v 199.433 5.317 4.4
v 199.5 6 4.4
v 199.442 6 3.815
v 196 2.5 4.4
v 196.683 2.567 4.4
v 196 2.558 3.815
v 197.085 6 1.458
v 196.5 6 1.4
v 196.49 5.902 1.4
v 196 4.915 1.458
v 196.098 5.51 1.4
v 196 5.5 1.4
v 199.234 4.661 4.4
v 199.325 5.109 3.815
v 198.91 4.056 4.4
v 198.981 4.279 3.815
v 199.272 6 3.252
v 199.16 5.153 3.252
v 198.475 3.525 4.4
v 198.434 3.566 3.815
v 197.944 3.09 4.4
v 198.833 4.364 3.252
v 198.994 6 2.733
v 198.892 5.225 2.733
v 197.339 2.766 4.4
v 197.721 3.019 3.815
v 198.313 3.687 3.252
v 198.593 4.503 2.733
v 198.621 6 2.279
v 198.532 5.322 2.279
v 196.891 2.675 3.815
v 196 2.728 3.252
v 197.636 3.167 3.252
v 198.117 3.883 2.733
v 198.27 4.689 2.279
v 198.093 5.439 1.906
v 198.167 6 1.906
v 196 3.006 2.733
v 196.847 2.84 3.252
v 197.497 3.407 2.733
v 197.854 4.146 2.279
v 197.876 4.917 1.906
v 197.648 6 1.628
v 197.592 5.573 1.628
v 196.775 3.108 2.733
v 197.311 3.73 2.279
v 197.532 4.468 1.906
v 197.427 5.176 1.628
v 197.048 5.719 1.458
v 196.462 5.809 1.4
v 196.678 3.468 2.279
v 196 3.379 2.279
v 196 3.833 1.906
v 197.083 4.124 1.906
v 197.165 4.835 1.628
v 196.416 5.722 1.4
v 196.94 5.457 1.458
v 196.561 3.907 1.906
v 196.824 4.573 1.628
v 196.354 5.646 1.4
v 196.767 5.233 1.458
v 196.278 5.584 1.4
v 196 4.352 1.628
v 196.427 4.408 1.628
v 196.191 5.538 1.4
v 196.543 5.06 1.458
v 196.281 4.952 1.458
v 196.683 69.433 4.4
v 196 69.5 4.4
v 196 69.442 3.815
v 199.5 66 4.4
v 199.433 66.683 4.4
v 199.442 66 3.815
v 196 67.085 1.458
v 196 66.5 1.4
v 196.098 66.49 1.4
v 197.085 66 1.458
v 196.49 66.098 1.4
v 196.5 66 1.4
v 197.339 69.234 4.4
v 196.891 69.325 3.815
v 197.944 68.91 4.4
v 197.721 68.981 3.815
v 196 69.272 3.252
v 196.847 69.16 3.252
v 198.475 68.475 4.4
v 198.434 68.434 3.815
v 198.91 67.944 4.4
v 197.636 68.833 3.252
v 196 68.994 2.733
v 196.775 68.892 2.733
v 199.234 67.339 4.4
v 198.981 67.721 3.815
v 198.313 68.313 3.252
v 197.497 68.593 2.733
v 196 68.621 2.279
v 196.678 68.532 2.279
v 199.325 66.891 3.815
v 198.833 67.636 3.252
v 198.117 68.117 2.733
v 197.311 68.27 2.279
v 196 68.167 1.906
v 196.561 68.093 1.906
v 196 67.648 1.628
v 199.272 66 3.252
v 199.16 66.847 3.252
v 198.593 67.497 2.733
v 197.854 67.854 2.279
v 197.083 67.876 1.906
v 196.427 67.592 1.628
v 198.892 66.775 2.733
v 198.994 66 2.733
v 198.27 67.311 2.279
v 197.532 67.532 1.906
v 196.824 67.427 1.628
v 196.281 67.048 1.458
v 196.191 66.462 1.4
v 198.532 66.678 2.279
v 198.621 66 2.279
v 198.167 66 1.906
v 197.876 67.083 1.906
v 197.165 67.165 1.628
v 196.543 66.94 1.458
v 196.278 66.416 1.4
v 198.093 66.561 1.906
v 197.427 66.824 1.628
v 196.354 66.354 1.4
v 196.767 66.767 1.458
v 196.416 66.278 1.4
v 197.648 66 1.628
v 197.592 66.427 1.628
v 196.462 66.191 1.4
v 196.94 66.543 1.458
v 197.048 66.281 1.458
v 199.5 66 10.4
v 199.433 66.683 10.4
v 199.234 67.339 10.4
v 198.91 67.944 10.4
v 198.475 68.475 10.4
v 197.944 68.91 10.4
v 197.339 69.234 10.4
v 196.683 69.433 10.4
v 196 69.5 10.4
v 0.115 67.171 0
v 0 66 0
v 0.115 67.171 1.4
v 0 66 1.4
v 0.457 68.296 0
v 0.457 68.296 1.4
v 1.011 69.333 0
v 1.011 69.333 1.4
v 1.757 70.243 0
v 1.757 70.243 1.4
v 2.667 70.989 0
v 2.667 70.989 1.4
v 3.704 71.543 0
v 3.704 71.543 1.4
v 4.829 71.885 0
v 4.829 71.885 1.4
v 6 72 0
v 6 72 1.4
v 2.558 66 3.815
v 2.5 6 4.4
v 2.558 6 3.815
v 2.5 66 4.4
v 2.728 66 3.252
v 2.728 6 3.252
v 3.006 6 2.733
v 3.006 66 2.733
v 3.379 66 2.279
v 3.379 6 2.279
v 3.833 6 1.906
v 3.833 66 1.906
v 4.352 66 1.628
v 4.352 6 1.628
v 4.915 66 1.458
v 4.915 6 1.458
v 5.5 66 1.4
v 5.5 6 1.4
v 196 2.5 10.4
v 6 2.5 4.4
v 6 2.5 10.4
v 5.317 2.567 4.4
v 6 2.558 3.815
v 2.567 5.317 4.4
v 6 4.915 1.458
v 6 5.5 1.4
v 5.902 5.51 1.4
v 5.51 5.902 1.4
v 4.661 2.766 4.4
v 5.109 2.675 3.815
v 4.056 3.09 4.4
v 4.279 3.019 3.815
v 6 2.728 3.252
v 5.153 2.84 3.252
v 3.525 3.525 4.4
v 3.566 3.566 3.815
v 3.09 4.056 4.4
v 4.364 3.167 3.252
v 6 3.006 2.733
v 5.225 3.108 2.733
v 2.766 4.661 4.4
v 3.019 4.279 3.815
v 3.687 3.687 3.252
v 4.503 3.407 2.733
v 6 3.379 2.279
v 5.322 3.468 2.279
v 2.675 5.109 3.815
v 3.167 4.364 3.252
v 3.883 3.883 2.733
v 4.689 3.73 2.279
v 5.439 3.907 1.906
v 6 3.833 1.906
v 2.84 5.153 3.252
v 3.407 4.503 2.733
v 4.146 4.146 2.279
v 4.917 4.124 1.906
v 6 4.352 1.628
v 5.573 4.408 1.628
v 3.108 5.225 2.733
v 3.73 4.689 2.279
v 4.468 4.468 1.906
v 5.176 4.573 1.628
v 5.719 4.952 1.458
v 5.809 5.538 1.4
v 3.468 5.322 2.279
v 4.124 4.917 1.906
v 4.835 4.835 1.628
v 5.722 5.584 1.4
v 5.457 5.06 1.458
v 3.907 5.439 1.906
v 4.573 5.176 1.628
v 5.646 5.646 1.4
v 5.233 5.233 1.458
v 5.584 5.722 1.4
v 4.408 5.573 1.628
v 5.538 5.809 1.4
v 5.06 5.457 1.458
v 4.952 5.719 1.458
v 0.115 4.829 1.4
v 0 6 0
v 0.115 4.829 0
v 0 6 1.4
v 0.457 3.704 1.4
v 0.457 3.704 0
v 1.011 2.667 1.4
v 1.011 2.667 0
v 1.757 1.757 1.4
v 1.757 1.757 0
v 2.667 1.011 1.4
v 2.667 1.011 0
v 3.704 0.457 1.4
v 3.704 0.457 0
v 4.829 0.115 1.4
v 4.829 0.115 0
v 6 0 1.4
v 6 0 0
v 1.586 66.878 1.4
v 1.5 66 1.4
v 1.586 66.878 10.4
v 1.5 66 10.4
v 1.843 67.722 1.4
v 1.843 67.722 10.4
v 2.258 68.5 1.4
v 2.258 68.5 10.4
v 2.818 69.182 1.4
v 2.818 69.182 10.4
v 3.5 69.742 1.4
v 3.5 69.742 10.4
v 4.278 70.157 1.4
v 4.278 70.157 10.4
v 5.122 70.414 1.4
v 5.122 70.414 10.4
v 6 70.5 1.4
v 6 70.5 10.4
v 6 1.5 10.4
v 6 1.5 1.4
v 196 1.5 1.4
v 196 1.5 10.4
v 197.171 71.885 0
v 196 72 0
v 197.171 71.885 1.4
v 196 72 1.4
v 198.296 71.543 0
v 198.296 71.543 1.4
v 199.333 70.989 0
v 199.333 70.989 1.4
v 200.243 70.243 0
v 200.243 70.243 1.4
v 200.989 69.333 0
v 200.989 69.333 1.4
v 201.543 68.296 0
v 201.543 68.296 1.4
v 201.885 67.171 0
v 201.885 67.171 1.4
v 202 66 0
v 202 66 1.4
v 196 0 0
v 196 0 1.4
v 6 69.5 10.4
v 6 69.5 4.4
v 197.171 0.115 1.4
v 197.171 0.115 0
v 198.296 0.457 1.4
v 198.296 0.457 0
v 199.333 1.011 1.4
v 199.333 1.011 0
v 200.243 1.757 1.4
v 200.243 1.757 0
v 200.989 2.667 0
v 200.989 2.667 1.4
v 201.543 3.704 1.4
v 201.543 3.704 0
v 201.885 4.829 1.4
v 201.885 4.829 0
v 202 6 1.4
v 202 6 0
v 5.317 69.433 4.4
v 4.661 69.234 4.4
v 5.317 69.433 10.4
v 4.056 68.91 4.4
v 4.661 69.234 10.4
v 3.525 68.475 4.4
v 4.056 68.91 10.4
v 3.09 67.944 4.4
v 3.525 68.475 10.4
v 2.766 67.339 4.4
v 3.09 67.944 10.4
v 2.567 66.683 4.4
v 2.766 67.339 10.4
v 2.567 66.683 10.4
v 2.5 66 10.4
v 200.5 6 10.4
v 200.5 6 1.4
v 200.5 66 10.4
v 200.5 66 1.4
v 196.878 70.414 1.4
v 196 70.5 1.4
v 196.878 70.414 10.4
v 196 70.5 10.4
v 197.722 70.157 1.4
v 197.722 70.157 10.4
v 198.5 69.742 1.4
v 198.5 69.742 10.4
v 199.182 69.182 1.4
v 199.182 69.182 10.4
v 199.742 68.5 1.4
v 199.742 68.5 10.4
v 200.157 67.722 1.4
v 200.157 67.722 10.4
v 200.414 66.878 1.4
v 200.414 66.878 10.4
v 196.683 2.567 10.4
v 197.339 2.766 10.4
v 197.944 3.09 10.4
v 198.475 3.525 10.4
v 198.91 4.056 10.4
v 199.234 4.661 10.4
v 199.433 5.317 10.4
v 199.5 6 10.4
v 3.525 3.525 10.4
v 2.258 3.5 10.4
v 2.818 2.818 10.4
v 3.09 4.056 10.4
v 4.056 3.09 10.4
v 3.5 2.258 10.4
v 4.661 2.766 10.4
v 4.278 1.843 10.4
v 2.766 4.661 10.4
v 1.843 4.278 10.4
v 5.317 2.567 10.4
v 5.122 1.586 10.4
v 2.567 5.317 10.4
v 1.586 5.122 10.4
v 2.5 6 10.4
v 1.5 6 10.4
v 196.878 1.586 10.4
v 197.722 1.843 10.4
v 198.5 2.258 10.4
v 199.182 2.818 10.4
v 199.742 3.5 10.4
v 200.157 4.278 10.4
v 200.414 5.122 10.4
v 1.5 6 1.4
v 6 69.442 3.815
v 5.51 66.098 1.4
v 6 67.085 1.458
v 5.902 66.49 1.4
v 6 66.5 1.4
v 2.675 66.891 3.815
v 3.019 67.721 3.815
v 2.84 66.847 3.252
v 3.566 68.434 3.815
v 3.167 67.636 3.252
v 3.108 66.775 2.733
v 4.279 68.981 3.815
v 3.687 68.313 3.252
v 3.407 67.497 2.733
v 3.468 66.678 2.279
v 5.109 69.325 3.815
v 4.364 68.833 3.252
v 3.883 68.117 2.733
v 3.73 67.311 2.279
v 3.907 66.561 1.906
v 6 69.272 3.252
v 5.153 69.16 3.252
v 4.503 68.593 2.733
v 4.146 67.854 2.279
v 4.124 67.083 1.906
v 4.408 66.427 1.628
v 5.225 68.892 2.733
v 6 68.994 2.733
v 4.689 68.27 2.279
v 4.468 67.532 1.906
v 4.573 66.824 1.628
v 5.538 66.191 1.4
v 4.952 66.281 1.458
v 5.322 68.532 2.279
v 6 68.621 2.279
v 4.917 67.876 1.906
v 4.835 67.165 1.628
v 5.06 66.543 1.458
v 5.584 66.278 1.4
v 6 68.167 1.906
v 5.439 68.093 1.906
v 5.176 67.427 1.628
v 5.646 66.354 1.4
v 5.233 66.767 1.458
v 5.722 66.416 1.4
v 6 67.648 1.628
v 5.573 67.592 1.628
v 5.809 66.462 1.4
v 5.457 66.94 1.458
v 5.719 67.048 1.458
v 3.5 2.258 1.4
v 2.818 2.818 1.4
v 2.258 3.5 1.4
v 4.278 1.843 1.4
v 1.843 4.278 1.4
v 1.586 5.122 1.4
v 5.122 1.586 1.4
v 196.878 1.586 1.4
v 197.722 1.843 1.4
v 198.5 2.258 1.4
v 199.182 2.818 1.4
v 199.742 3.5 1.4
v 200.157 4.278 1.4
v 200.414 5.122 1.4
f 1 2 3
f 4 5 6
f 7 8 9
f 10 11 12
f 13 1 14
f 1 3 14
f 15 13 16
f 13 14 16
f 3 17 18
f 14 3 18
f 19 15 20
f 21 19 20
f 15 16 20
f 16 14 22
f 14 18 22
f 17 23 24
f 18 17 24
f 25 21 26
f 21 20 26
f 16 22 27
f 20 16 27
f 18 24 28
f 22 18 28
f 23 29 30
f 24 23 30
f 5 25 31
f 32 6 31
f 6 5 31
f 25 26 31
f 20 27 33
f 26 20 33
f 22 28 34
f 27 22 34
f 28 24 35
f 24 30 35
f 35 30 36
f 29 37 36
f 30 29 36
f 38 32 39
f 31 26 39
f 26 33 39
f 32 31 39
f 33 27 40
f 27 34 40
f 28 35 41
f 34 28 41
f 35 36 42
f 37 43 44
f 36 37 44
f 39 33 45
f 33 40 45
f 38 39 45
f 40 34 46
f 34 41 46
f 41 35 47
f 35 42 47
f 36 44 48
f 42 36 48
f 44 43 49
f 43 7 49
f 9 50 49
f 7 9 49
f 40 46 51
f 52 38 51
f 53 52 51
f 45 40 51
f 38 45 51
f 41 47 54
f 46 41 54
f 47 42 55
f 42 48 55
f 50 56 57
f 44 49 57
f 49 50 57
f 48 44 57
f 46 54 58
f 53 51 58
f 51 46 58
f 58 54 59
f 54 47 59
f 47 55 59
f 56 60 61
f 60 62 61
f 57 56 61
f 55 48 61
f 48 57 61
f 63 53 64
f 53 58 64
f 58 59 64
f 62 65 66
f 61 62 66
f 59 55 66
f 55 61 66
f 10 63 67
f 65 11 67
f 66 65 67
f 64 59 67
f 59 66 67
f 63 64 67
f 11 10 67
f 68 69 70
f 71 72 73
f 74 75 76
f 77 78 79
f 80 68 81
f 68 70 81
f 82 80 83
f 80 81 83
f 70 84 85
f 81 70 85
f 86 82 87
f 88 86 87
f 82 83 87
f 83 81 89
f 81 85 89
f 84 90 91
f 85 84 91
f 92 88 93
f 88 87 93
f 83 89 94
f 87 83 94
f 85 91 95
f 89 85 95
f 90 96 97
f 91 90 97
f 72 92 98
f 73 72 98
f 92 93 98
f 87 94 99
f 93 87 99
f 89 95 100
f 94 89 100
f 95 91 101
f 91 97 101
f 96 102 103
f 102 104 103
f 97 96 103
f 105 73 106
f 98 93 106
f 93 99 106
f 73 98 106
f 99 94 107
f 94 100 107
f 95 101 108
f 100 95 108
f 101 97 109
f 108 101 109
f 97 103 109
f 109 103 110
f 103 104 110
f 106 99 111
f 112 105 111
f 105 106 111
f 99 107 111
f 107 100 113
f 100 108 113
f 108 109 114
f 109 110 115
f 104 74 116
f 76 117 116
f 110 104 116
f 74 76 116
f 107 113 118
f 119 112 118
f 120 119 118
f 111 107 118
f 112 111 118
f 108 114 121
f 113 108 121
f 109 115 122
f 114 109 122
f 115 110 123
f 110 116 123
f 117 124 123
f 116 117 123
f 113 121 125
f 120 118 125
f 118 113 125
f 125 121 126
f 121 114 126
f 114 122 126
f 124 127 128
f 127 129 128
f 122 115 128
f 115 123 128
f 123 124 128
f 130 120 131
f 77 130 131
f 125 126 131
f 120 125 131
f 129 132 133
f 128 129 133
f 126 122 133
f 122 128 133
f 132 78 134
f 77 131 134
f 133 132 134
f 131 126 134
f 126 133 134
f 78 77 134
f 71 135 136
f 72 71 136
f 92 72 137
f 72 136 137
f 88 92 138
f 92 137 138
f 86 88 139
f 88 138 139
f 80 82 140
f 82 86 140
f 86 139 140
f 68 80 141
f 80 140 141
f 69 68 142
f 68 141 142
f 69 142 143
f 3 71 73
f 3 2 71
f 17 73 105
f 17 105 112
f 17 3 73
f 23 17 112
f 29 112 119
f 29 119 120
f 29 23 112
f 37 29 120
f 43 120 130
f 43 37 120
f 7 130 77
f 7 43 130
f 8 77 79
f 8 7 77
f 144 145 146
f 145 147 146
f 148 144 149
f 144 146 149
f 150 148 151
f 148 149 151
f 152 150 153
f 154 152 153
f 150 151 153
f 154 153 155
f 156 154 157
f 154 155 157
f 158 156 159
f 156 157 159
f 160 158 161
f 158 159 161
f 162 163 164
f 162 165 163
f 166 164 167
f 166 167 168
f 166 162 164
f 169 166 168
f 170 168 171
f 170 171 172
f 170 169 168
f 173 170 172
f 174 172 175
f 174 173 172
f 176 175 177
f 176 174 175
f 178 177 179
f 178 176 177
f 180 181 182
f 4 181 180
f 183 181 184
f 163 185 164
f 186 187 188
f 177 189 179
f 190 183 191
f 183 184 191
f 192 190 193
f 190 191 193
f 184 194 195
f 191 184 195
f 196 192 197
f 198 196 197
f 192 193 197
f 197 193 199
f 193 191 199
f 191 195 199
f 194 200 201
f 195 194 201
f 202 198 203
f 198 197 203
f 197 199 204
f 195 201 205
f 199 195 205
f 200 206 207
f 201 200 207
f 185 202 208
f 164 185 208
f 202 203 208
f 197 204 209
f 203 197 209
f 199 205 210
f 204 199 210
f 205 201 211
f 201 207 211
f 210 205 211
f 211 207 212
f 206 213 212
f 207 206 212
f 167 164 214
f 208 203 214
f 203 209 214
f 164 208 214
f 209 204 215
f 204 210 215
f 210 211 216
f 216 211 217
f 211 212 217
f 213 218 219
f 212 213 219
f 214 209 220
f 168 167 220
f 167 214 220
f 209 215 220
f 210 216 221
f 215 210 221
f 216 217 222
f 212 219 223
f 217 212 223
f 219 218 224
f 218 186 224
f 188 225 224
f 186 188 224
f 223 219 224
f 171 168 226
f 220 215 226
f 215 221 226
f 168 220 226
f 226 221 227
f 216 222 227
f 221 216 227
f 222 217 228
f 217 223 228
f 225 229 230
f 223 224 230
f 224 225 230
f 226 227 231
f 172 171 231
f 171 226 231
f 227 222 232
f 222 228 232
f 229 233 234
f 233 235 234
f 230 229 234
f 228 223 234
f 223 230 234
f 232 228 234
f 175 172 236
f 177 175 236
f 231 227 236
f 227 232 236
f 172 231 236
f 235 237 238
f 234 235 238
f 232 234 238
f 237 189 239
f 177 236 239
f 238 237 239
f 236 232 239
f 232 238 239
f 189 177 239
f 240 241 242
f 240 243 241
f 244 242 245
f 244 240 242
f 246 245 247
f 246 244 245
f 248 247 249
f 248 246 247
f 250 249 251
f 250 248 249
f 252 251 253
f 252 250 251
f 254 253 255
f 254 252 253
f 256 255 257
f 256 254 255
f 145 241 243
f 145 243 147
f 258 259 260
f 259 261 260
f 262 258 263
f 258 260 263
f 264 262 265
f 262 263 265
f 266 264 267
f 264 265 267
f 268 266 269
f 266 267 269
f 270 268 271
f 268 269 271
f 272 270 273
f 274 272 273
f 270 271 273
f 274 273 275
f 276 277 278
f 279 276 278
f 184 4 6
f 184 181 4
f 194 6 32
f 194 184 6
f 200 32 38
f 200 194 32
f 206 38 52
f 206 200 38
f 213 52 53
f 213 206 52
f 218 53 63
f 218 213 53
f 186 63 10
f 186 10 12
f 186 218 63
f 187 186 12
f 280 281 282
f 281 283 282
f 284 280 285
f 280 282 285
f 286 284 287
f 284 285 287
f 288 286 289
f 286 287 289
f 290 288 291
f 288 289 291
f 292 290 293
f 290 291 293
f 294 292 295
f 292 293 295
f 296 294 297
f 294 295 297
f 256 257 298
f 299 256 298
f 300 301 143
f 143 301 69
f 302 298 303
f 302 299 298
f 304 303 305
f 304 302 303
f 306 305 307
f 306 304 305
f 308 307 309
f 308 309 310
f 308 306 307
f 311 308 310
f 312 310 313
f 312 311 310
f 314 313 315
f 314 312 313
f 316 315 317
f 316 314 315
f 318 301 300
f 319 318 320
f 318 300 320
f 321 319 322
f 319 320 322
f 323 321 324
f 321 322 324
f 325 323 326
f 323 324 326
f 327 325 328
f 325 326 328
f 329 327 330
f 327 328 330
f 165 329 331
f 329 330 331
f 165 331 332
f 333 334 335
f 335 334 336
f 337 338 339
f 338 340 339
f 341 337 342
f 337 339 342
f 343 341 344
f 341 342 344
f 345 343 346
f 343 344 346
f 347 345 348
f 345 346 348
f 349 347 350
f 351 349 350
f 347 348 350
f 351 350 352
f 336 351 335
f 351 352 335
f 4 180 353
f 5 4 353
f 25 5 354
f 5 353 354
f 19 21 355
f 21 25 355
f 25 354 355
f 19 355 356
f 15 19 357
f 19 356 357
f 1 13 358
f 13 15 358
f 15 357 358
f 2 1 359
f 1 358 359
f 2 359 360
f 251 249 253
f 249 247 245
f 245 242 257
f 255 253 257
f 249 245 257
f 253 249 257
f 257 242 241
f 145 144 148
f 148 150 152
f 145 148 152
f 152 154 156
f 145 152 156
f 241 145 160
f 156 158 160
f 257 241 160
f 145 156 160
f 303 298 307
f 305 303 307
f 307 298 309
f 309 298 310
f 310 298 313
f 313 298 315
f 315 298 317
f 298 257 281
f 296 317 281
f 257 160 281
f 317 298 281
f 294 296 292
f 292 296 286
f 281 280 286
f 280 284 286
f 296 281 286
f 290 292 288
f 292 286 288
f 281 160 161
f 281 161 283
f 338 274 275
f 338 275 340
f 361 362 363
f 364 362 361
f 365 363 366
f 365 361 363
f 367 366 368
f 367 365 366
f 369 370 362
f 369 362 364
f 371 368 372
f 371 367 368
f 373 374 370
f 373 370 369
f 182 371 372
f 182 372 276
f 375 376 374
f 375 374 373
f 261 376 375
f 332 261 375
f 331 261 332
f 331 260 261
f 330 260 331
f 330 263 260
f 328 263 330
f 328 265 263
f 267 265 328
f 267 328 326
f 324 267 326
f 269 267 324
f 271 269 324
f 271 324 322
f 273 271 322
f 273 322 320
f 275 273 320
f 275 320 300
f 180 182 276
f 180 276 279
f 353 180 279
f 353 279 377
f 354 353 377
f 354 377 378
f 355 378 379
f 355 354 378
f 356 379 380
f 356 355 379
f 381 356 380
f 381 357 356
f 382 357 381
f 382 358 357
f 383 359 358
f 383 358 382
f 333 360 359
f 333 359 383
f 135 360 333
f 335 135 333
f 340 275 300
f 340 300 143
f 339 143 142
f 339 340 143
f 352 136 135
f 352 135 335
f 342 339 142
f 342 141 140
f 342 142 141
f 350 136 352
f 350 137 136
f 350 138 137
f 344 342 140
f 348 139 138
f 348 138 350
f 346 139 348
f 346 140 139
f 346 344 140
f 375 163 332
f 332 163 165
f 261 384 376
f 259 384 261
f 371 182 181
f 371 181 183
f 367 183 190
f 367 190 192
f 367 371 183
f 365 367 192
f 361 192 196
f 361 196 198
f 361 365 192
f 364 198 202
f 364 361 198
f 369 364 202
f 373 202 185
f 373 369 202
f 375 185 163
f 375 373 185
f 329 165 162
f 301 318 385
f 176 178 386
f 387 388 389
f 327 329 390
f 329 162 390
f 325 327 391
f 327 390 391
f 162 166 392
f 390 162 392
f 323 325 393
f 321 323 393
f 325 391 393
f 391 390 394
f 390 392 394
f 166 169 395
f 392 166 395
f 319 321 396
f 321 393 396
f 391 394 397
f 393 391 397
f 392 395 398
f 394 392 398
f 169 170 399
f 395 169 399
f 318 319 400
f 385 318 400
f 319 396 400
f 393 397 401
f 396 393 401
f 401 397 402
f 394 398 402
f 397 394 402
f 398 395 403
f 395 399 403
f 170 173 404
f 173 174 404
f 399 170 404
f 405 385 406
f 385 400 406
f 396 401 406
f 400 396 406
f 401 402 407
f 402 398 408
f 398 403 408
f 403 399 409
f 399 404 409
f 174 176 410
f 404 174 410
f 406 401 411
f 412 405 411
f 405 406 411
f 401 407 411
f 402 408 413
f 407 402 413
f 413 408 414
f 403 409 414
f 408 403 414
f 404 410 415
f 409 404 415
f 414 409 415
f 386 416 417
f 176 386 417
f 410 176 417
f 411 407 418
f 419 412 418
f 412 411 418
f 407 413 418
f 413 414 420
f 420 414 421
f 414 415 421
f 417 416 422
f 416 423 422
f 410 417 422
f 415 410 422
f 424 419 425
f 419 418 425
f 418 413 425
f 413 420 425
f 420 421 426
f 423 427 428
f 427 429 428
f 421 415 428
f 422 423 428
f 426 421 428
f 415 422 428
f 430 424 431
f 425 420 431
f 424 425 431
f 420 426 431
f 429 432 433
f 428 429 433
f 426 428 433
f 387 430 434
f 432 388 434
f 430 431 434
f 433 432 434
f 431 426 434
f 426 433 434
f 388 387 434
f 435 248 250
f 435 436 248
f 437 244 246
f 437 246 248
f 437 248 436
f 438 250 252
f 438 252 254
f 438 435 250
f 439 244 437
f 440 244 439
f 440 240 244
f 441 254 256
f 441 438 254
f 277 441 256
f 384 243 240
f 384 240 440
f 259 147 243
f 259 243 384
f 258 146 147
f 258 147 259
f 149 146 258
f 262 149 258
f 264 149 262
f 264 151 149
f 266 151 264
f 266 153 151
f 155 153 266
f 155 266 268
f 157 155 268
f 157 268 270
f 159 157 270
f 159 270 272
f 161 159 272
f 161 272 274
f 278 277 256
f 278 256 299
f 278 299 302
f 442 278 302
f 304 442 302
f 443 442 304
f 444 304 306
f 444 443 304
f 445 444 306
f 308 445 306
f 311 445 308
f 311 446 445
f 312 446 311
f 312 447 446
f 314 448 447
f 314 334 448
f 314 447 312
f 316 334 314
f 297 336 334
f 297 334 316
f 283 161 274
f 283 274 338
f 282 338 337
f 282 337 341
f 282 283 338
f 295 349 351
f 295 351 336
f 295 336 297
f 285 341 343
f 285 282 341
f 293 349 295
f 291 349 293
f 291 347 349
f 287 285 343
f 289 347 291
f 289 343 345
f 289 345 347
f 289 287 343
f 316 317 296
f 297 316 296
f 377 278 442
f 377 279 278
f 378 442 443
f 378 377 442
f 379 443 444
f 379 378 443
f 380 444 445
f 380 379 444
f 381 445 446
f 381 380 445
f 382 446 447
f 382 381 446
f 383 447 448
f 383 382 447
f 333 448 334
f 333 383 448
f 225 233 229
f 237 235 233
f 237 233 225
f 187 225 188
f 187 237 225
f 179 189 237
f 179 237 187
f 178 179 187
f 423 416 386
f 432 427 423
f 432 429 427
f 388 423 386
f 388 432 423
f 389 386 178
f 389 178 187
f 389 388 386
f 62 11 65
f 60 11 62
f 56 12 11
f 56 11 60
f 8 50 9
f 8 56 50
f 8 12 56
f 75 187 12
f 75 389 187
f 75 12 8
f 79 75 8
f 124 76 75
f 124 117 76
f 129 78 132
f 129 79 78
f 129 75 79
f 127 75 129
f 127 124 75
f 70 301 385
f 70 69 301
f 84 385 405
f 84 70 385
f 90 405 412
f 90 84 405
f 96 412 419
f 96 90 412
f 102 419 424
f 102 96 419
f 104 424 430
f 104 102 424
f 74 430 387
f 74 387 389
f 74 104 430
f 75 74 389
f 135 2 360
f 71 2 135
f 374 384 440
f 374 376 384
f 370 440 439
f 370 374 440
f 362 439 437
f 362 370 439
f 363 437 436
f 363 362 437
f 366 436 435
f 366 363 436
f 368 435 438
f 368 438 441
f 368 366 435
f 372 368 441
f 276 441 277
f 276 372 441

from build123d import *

# Parameters (mm, degrees)
SKETCH1_W           = 202
SKETCH1_H           = 72
BOSS_EXTRUDE1_DEPTH = 1.4
SKETCH2_W           = 199
SKETCH2_H           = 69
SKETCH2_W_2         = 197
SKETCH2_H_2         = 67
BOSS_EXTRUDE2_DEPTH = 9
FILLET1_R           = 3.5
FILLET2_R           = 4.5
FILLET3_R           = 6
FILLET4_R           = 3


with BuildPart() as part:
    # Sketch1 → Boss-Extrude1 (new body)
    with BuildSketch(Plane.XY):
        with Locations((101, 36)):
            Rectangle(SKETCH1_W, SKETCH1_H)
    extrude(amount=BOSS_EXTRUDE1_DEPTH)

    # Sketch2 → Boss-Extrude2 (add)
    with BuildSketch(Plane.XY.offset(1.4)):
        with Locations((101, 36)):
            Rectangle(SKETCH2_W, SKETCH2_H)
        with Locations((101, 36)):
            Rectangle(SKETCH2_W_2, SKETCH2_H_2, mode=Mode.SUBTRACT)
    extrude(amount=BOSS_EXTRUDE2_DEPTH)

    # Fillet1
    fillet1_edges = [part.edges().sort_by_distance(p)[0] for p in [
        (2.5, 2.5, 5.9),
        (199.5, 2.5, 5.9),
        (199.5, 69.5, 5.9),
        (2.5, 69.5, 5.9),
    ]]
    fillet(fillet1_edges, radius=FILLET1_R)

    # Fillet2
    fillet2_edges = [part.edges().sort_by_distance(p)[0] for p in [
        (1.5, 70.5, 5.9),
        (1.5, 1.5, 5.9),
        (200.5, 1.5, 5.9),
        (200.5, 70.5, 5.9),
    ]]
    fillet(fillet2_edges, radius=FILLET2_R)

    # Fillet3
    fillet3_edges = [part.edges().sort_by_distance(p)[0] for p in [
        (0, 72, 0.7),
        (202, 72, 0.7),
        (202, 0, 0.7),
        (0, 0, 0.7),
    ]]
    fillet(fillet3_edges, radius=FILLET3_R)

    # Fillet4
    fillet4_edges = [part.edges().sort_by_distance(p)[0] for p in [
        (101, 69.5, 1.4),
        (2.5, 36, 1.4),
        (101, 2.5, 1.4),
        (199.5, 36, 1.4),
        (198.474873734, 3.525126266, 1.4),
        (198.474873734, 68.474873734, 1.4),
        (3.525126266, 3.525126266, 1.4),
        (3.525126266, 68.474873734, 1.4),
    ]]
    fillet(fillet4_edges, radius=FILLET4_R)


solid = part.part
